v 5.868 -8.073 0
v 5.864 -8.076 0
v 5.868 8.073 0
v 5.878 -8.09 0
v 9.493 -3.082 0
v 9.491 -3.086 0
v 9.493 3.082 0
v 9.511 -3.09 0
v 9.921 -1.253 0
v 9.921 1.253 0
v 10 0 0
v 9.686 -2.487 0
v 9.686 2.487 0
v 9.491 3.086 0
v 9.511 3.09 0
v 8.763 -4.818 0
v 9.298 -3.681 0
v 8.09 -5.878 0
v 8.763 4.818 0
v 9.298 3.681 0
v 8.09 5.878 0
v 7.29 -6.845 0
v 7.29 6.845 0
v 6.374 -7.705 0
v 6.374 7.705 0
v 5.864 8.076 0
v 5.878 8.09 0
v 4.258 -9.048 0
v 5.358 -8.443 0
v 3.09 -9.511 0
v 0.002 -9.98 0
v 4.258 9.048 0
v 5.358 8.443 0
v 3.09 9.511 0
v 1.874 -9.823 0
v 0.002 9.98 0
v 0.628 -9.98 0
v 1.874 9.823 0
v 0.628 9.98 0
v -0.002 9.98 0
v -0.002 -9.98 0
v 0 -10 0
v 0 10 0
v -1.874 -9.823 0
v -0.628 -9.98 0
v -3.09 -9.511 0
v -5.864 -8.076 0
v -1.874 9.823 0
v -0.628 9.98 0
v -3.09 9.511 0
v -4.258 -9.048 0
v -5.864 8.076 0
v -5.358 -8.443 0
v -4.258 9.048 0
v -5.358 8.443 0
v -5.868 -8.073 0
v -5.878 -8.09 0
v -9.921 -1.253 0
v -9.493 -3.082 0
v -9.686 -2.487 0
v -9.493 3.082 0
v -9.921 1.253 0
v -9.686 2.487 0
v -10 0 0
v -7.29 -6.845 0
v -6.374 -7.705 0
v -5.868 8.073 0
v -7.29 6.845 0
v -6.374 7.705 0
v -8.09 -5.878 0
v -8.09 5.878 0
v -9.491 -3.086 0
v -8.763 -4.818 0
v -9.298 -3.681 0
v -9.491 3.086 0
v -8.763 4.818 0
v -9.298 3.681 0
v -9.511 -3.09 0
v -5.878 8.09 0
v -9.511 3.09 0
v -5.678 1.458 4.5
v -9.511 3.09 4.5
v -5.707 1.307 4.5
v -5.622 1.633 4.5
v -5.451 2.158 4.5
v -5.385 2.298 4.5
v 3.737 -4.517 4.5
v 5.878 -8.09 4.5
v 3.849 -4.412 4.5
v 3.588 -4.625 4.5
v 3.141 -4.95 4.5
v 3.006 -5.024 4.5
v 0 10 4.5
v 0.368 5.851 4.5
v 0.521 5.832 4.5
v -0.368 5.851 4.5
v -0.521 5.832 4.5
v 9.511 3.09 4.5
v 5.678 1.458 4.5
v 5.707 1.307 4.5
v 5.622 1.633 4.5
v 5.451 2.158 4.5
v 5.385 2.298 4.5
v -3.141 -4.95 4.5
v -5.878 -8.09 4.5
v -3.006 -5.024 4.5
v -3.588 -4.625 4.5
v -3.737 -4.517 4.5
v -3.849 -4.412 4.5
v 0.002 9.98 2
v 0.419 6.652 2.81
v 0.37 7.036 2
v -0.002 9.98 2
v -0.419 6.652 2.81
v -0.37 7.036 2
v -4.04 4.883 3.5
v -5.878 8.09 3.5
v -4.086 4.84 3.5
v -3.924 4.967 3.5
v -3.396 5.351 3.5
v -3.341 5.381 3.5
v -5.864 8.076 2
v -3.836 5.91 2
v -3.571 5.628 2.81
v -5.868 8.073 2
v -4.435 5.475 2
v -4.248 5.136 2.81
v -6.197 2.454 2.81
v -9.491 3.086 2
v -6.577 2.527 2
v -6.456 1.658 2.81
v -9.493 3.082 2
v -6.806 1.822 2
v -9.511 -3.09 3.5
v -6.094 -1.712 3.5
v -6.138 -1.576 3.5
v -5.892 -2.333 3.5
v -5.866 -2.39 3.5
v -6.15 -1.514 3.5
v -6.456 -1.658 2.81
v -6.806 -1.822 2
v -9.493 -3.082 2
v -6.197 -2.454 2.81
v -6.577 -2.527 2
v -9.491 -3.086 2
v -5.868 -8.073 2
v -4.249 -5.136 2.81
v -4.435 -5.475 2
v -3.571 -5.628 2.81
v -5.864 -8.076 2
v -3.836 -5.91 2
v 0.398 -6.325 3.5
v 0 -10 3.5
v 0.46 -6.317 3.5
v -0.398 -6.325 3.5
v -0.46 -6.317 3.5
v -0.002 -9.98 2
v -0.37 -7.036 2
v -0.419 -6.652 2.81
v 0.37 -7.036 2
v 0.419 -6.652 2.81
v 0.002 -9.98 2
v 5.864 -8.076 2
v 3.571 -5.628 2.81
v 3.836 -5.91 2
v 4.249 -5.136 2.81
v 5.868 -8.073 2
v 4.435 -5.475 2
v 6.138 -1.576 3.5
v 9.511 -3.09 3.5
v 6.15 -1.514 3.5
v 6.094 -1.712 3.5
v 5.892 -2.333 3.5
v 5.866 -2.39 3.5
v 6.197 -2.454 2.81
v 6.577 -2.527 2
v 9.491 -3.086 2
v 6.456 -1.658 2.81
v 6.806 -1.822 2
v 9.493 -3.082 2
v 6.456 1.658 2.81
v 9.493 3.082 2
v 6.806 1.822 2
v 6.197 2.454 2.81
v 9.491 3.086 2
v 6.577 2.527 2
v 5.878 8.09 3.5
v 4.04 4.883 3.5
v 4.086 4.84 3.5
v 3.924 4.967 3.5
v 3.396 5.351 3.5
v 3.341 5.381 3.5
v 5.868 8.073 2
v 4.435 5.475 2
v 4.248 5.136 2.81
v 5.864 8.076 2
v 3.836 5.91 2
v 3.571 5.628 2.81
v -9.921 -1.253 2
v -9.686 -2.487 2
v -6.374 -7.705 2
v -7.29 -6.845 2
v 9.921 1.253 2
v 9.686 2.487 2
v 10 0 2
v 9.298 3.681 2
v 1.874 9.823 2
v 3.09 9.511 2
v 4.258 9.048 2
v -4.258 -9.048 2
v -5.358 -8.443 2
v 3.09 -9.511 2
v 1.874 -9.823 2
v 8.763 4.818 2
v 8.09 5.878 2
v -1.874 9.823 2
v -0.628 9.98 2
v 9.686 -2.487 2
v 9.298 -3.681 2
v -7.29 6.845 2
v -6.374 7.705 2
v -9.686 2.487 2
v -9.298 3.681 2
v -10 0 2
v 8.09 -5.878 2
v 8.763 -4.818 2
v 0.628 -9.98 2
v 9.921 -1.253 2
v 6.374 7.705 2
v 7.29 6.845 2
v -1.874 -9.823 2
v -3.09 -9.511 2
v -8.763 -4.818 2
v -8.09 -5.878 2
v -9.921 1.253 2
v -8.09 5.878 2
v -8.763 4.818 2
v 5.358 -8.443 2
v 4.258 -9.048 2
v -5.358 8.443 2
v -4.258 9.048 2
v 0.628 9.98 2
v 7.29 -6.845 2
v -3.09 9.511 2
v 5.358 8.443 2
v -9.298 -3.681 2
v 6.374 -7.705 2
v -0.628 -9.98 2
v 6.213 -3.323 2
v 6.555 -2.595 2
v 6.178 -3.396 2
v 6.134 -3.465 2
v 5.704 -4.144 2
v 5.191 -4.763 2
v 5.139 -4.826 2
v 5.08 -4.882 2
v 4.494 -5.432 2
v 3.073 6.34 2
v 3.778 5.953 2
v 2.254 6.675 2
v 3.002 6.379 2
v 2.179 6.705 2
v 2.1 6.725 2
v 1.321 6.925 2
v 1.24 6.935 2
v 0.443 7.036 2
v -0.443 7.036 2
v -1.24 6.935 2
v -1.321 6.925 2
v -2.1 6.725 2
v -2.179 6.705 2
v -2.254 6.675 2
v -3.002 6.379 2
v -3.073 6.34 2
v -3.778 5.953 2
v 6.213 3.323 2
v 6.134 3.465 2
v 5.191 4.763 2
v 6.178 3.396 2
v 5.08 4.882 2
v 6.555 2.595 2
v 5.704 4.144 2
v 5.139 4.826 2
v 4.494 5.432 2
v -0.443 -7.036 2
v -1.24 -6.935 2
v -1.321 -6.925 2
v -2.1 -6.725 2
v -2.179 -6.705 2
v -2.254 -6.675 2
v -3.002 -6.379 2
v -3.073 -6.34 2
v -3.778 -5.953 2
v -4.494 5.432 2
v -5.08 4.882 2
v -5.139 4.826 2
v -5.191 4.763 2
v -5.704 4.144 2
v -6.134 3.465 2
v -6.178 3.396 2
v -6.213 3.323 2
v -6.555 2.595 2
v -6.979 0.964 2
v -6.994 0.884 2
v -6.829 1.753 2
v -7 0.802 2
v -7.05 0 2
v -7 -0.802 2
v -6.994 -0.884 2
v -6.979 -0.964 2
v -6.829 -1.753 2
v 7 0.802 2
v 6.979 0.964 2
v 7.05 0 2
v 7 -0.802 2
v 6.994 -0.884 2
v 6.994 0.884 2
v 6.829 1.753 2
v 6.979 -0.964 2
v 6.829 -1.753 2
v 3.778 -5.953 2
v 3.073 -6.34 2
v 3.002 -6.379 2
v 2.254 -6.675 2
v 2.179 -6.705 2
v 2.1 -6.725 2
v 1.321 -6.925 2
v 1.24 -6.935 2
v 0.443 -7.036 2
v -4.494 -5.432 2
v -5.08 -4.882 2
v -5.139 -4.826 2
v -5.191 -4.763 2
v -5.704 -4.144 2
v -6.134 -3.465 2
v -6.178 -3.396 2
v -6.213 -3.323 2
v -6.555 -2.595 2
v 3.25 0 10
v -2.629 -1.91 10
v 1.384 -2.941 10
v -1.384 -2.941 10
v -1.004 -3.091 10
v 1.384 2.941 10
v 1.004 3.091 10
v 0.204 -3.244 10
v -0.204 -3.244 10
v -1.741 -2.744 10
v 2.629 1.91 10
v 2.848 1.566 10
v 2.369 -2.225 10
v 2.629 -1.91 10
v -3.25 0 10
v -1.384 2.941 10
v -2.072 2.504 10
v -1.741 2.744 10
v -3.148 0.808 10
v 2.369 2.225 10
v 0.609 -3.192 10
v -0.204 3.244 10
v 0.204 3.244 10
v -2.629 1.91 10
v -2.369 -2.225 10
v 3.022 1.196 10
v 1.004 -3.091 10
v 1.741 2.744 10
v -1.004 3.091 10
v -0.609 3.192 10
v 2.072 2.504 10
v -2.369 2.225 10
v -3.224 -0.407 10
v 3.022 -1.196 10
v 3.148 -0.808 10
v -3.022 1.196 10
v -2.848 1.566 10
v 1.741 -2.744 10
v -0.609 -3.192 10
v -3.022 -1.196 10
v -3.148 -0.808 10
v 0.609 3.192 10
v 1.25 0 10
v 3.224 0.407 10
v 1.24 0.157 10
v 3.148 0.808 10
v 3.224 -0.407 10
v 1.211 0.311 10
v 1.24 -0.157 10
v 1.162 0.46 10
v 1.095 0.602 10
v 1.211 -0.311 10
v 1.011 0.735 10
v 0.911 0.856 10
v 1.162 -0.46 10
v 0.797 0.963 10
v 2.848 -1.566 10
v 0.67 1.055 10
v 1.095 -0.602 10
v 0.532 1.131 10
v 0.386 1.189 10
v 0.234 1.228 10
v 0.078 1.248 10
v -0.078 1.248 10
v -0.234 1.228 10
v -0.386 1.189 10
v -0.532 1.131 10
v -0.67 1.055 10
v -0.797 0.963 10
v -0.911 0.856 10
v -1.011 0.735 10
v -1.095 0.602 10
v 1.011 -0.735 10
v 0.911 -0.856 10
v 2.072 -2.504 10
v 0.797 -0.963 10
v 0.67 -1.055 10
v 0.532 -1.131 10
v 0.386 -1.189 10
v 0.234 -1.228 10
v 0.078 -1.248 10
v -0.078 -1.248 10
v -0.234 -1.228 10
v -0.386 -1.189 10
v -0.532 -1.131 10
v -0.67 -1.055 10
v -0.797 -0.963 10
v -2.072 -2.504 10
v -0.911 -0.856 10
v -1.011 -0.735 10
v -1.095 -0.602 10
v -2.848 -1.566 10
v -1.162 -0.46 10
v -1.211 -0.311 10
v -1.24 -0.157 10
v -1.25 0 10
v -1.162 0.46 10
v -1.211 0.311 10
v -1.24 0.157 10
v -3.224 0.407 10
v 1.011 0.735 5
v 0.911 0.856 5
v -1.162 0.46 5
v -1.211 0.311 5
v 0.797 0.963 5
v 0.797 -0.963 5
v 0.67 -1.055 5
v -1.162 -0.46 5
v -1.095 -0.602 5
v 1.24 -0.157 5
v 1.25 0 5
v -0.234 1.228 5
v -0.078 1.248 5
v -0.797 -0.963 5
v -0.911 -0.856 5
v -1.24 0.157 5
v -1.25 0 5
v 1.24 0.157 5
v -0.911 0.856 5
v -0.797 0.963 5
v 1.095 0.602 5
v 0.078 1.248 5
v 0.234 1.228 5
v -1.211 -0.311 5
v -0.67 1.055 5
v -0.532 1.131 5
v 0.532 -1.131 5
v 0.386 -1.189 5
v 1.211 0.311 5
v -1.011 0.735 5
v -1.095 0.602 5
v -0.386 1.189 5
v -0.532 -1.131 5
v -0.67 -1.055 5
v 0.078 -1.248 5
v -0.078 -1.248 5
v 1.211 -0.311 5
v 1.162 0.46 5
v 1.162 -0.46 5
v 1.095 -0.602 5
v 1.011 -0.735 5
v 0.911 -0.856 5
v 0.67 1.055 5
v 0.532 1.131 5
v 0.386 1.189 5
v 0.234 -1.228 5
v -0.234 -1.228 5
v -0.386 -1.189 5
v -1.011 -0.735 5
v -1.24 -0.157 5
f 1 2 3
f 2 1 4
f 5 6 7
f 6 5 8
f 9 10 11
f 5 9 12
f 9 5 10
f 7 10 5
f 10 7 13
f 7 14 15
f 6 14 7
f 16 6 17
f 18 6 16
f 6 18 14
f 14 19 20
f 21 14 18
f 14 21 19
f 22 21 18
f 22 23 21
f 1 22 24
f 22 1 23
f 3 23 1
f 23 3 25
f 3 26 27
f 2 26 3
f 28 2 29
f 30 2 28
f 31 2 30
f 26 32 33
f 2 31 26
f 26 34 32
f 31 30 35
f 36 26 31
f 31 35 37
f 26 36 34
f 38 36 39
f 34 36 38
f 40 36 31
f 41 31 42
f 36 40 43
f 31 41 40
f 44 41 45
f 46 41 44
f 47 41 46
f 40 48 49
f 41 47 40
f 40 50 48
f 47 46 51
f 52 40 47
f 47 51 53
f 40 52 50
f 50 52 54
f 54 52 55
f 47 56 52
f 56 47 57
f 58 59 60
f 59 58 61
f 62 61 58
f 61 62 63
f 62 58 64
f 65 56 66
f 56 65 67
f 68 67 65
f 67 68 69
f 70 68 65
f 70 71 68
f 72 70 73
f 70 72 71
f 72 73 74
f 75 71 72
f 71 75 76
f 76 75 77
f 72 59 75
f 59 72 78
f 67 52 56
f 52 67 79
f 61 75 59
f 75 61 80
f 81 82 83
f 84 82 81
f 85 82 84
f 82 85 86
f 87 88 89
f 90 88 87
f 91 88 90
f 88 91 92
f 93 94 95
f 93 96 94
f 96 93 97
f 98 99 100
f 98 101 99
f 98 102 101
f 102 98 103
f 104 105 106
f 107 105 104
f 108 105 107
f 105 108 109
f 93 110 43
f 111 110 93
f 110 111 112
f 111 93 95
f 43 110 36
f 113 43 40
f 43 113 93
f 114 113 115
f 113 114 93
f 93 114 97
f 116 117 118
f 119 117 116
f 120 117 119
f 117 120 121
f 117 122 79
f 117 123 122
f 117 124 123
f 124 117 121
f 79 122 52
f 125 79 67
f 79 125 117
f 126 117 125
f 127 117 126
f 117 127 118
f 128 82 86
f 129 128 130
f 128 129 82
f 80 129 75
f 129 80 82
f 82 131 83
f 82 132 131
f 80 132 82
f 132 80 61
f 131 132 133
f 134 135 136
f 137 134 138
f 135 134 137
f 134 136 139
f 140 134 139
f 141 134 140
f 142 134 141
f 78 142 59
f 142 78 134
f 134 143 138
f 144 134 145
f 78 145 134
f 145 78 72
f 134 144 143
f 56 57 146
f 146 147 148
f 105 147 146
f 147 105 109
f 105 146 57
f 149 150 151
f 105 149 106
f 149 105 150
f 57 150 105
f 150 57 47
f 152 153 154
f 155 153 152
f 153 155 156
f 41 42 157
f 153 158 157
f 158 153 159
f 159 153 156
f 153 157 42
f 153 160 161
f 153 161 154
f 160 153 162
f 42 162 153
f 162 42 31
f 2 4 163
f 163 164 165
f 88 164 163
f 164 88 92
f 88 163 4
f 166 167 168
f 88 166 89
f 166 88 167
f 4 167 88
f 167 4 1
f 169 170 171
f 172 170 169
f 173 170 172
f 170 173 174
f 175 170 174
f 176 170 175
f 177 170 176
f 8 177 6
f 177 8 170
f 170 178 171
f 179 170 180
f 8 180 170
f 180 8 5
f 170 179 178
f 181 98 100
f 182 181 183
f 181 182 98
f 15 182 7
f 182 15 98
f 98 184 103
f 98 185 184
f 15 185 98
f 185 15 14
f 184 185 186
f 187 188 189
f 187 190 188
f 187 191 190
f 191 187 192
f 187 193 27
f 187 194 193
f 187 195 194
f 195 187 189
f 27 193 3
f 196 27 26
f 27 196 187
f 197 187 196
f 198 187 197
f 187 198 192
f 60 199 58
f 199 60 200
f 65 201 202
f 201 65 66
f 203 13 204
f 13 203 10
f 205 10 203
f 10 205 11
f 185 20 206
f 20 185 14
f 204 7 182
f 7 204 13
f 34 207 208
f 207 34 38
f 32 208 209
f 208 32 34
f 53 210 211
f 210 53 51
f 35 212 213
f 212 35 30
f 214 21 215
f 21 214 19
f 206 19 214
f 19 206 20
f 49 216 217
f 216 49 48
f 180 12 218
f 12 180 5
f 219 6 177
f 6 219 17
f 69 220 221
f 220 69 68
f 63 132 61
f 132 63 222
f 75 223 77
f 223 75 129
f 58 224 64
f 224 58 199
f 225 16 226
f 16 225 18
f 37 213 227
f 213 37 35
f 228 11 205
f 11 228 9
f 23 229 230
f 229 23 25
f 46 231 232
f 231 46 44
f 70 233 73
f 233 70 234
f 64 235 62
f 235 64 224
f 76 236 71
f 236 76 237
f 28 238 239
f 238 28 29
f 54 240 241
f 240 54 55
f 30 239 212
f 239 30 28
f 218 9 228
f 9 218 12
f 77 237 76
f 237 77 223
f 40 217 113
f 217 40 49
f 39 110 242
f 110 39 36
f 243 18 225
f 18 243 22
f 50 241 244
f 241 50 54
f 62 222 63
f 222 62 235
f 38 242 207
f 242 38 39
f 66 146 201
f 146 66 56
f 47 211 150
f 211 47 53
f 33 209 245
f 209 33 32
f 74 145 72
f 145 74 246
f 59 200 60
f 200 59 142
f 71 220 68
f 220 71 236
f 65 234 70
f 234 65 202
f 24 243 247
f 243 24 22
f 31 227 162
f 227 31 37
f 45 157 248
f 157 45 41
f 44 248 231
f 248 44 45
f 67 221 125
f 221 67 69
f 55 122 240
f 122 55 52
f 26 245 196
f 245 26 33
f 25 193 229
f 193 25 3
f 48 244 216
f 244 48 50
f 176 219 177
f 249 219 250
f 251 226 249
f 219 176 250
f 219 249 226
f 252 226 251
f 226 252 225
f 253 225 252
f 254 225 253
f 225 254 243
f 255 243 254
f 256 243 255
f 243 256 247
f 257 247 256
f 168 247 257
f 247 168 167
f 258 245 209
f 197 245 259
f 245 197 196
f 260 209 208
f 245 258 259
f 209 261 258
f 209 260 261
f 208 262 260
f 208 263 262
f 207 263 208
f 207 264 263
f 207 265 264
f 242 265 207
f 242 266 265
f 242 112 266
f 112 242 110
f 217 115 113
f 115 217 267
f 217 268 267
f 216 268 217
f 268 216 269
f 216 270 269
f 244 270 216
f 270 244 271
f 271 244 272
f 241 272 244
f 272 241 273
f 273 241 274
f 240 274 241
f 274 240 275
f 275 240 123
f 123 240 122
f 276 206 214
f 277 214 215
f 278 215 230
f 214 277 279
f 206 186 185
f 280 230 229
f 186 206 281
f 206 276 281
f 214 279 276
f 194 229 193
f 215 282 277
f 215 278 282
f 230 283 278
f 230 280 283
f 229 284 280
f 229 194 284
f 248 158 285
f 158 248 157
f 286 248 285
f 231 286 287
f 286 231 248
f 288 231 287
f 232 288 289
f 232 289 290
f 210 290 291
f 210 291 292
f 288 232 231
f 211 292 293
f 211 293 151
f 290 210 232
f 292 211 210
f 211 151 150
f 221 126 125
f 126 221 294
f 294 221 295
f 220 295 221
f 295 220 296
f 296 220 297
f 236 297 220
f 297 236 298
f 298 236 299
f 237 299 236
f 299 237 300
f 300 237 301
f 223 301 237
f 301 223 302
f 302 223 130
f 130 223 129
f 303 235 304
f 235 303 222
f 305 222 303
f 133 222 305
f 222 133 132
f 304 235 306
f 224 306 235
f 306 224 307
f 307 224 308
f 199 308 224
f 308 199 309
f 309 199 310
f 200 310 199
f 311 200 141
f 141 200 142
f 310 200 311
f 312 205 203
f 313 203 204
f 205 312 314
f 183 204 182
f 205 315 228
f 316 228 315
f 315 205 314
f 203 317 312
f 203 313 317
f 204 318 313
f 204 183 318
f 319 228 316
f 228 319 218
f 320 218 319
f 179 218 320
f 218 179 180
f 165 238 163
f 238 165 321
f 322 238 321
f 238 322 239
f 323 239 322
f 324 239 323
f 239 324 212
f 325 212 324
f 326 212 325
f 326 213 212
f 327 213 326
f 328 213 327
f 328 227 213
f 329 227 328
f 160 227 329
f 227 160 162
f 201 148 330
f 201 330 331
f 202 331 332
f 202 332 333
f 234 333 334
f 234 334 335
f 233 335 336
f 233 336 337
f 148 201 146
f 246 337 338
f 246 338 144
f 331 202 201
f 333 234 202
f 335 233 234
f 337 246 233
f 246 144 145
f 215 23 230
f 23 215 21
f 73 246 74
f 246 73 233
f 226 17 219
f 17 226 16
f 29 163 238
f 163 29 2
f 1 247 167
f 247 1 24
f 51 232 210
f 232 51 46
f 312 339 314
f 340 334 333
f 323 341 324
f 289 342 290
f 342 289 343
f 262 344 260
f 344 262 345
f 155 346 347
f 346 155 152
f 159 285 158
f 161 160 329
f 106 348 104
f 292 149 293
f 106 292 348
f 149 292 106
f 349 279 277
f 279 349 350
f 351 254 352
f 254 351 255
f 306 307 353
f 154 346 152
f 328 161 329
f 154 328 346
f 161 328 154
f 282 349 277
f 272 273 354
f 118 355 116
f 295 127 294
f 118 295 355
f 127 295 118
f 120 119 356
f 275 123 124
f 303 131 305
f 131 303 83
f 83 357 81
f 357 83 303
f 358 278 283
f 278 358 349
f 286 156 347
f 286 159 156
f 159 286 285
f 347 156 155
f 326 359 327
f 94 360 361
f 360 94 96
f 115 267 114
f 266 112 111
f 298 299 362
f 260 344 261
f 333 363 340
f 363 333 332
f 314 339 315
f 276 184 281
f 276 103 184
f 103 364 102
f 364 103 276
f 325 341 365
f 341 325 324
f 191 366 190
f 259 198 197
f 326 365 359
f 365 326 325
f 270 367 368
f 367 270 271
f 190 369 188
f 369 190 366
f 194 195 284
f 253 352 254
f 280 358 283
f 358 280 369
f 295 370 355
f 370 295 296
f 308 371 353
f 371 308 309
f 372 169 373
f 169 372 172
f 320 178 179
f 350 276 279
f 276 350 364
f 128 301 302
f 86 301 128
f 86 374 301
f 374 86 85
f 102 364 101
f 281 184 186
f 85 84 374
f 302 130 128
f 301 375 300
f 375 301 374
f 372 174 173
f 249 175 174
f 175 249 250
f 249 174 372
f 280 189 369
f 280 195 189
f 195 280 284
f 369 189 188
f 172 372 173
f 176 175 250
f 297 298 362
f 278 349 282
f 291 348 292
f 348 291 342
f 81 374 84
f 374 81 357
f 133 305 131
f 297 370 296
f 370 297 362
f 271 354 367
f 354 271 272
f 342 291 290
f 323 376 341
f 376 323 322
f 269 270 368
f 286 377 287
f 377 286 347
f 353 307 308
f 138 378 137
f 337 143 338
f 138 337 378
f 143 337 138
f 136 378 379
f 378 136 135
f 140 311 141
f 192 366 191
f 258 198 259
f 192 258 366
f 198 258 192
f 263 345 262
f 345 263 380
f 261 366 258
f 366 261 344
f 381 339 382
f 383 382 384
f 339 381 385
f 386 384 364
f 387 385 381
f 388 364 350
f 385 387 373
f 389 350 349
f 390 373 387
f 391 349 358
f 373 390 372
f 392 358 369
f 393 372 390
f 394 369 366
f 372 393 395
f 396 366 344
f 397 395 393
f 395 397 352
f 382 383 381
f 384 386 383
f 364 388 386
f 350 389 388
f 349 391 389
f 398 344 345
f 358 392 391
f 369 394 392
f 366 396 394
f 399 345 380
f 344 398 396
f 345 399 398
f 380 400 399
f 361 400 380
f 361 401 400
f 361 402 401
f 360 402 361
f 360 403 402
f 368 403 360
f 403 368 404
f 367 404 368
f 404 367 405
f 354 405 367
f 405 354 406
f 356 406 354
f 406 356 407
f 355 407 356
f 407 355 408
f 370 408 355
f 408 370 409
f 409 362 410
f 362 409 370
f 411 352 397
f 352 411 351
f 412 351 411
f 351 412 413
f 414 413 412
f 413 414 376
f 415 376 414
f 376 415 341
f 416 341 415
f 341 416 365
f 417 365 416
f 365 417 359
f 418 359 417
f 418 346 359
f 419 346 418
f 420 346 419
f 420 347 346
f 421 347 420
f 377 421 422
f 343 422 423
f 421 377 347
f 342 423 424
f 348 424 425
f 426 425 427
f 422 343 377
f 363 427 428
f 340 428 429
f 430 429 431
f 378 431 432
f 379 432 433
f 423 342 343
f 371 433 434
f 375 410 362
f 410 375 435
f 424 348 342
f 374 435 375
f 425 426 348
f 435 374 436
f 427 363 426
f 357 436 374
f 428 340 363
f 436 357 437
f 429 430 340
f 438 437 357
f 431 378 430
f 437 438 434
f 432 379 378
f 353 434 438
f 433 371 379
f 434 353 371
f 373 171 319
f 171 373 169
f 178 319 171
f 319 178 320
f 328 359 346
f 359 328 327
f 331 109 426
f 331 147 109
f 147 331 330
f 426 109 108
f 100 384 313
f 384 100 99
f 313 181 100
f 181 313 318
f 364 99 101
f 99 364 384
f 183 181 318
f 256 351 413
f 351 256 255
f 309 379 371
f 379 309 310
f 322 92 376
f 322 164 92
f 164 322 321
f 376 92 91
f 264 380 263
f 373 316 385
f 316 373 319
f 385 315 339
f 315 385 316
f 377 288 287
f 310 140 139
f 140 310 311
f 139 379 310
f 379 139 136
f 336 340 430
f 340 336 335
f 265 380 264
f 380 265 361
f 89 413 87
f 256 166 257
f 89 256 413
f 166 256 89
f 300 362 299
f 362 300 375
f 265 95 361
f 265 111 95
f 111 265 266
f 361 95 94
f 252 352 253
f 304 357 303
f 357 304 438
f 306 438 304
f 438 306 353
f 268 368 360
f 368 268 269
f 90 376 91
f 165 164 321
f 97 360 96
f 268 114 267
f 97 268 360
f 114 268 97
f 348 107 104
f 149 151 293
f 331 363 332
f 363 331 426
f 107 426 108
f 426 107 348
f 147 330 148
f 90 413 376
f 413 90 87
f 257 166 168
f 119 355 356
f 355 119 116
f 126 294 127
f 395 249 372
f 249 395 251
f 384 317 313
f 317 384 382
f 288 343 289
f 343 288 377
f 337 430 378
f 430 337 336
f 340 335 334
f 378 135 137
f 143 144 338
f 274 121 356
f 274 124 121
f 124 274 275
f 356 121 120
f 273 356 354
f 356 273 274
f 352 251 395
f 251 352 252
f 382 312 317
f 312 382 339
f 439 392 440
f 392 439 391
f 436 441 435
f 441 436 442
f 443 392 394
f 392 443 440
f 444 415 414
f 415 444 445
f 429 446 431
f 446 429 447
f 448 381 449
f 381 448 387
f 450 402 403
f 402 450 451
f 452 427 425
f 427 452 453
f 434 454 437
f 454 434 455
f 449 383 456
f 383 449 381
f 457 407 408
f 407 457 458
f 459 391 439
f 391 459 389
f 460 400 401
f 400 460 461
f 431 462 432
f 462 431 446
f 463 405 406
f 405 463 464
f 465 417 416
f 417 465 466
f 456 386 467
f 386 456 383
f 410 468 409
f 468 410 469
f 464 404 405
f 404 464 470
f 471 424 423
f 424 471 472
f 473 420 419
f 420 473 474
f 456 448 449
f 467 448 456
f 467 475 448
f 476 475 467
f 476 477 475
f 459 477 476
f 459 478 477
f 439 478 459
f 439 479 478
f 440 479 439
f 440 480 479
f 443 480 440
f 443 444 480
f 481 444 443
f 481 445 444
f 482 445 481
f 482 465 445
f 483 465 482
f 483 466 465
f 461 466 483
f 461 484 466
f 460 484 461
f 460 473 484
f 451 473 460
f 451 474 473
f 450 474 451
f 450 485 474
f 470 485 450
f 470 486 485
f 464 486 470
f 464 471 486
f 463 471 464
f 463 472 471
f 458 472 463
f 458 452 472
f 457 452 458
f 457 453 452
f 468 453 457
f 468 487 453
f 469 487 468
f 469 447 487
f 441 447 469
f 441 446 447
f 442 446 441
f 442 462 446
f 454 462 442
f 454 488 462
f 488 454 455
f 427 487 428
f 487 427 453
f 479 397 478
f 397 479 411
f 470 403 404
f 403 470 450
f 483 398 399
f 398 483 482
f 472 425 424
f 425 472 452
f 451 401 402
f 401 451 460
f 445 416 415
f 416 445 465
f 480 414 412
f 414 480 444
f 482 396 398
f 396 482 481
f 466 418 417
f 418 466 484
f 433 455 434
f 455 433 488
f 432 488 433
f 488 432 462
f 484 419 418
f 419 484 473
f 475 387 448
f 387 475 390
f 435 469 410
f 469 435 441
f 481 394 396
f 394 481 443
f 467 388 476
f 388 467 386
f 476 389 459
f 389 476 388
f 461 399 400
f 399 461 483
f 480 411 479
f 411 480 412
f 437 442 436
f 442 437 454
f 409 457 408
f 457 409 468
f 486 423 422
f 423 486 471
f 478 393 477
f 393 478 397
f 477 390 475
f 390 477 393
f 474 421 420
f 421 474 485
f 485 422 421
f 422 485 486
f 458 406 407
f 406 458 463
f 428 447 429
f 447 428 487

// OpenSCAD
/* [Base Parameters] */

// in mm
baseDiameter = 20; // [1:0.1:50]

// in mm (take care to use the core diameter - default is an M3 screw)
threadDiameter = 2.5; // [1:0.01:20]

// in mm (extension height)
footHeight = 5; // [1:0.01:50]

// in mm (distance that the screw enter the extension)
threadHeight = 5; // [1:0.1:50]

// in mm
thickness = 2; // [0.1:0.01:10]

// used as §fn value
resolution = 50;

/* [Tick Parameters] */
// number of ticks (take the thread pitch as a reference - M3 pitch: 0.5)
ticks = 5; // [0:1:36]

// number of sub ticks per tick
subTicks = 1; // [0:1:20]

// in mm (tick height)
tickHeight = 2.5; // [1:0.1:50]

// in mm (sub tick height)
subTickHeight = 1.5; // [1:0.1:50]

/* [Hidden] */

$fn = resolution;

difference() {
    union() {
        cylinder(h = thickness, r = baseDiameter / 2);
        cylinder(h = footHeight + threadHeight, r1 = baseDiameter / 2 - thickness, r2 = threadDiameter / 2 + thickness);
        tickWidth = max(thickness, threadDiameter);
        for(tickAngle = [0 : 360 / ticks : 360]) {
            rotate([0, 0, tickAngle]) {
                linear_extrude(height = tickHeight + thickness) {
                    polygon(points = [ [-tickWidth / 2, 0], [tickWidth / 2, 0], [0, baseDiameter / 2] ]);
                }
                for(subTickAngle = [(360 / ticks) / (subTicks + 1) : (360 / ticks) / (subTicks + 1) : 360 / ticks - 0.00001]) { // - 0.00001 to avoid the last subTick to be drawn - this is an ugly hack but shouldn't bring any problems
                    rotate([0, 0, subTickAngle]) {
                        linear_extrude(height = subTickHeight + thickness) {
                            polygon(points = [ [-tickWidth / 2, 0], [tickWidth / 2, 0], [0, baseDiameter / 2] ]);
                        }
                    }
                }
            }
        }
    }
    translate([0, 0, footHeight]) {
        cylinder(h = threadHeight + 1, r = threadDiameter / 2);
    }
} 
